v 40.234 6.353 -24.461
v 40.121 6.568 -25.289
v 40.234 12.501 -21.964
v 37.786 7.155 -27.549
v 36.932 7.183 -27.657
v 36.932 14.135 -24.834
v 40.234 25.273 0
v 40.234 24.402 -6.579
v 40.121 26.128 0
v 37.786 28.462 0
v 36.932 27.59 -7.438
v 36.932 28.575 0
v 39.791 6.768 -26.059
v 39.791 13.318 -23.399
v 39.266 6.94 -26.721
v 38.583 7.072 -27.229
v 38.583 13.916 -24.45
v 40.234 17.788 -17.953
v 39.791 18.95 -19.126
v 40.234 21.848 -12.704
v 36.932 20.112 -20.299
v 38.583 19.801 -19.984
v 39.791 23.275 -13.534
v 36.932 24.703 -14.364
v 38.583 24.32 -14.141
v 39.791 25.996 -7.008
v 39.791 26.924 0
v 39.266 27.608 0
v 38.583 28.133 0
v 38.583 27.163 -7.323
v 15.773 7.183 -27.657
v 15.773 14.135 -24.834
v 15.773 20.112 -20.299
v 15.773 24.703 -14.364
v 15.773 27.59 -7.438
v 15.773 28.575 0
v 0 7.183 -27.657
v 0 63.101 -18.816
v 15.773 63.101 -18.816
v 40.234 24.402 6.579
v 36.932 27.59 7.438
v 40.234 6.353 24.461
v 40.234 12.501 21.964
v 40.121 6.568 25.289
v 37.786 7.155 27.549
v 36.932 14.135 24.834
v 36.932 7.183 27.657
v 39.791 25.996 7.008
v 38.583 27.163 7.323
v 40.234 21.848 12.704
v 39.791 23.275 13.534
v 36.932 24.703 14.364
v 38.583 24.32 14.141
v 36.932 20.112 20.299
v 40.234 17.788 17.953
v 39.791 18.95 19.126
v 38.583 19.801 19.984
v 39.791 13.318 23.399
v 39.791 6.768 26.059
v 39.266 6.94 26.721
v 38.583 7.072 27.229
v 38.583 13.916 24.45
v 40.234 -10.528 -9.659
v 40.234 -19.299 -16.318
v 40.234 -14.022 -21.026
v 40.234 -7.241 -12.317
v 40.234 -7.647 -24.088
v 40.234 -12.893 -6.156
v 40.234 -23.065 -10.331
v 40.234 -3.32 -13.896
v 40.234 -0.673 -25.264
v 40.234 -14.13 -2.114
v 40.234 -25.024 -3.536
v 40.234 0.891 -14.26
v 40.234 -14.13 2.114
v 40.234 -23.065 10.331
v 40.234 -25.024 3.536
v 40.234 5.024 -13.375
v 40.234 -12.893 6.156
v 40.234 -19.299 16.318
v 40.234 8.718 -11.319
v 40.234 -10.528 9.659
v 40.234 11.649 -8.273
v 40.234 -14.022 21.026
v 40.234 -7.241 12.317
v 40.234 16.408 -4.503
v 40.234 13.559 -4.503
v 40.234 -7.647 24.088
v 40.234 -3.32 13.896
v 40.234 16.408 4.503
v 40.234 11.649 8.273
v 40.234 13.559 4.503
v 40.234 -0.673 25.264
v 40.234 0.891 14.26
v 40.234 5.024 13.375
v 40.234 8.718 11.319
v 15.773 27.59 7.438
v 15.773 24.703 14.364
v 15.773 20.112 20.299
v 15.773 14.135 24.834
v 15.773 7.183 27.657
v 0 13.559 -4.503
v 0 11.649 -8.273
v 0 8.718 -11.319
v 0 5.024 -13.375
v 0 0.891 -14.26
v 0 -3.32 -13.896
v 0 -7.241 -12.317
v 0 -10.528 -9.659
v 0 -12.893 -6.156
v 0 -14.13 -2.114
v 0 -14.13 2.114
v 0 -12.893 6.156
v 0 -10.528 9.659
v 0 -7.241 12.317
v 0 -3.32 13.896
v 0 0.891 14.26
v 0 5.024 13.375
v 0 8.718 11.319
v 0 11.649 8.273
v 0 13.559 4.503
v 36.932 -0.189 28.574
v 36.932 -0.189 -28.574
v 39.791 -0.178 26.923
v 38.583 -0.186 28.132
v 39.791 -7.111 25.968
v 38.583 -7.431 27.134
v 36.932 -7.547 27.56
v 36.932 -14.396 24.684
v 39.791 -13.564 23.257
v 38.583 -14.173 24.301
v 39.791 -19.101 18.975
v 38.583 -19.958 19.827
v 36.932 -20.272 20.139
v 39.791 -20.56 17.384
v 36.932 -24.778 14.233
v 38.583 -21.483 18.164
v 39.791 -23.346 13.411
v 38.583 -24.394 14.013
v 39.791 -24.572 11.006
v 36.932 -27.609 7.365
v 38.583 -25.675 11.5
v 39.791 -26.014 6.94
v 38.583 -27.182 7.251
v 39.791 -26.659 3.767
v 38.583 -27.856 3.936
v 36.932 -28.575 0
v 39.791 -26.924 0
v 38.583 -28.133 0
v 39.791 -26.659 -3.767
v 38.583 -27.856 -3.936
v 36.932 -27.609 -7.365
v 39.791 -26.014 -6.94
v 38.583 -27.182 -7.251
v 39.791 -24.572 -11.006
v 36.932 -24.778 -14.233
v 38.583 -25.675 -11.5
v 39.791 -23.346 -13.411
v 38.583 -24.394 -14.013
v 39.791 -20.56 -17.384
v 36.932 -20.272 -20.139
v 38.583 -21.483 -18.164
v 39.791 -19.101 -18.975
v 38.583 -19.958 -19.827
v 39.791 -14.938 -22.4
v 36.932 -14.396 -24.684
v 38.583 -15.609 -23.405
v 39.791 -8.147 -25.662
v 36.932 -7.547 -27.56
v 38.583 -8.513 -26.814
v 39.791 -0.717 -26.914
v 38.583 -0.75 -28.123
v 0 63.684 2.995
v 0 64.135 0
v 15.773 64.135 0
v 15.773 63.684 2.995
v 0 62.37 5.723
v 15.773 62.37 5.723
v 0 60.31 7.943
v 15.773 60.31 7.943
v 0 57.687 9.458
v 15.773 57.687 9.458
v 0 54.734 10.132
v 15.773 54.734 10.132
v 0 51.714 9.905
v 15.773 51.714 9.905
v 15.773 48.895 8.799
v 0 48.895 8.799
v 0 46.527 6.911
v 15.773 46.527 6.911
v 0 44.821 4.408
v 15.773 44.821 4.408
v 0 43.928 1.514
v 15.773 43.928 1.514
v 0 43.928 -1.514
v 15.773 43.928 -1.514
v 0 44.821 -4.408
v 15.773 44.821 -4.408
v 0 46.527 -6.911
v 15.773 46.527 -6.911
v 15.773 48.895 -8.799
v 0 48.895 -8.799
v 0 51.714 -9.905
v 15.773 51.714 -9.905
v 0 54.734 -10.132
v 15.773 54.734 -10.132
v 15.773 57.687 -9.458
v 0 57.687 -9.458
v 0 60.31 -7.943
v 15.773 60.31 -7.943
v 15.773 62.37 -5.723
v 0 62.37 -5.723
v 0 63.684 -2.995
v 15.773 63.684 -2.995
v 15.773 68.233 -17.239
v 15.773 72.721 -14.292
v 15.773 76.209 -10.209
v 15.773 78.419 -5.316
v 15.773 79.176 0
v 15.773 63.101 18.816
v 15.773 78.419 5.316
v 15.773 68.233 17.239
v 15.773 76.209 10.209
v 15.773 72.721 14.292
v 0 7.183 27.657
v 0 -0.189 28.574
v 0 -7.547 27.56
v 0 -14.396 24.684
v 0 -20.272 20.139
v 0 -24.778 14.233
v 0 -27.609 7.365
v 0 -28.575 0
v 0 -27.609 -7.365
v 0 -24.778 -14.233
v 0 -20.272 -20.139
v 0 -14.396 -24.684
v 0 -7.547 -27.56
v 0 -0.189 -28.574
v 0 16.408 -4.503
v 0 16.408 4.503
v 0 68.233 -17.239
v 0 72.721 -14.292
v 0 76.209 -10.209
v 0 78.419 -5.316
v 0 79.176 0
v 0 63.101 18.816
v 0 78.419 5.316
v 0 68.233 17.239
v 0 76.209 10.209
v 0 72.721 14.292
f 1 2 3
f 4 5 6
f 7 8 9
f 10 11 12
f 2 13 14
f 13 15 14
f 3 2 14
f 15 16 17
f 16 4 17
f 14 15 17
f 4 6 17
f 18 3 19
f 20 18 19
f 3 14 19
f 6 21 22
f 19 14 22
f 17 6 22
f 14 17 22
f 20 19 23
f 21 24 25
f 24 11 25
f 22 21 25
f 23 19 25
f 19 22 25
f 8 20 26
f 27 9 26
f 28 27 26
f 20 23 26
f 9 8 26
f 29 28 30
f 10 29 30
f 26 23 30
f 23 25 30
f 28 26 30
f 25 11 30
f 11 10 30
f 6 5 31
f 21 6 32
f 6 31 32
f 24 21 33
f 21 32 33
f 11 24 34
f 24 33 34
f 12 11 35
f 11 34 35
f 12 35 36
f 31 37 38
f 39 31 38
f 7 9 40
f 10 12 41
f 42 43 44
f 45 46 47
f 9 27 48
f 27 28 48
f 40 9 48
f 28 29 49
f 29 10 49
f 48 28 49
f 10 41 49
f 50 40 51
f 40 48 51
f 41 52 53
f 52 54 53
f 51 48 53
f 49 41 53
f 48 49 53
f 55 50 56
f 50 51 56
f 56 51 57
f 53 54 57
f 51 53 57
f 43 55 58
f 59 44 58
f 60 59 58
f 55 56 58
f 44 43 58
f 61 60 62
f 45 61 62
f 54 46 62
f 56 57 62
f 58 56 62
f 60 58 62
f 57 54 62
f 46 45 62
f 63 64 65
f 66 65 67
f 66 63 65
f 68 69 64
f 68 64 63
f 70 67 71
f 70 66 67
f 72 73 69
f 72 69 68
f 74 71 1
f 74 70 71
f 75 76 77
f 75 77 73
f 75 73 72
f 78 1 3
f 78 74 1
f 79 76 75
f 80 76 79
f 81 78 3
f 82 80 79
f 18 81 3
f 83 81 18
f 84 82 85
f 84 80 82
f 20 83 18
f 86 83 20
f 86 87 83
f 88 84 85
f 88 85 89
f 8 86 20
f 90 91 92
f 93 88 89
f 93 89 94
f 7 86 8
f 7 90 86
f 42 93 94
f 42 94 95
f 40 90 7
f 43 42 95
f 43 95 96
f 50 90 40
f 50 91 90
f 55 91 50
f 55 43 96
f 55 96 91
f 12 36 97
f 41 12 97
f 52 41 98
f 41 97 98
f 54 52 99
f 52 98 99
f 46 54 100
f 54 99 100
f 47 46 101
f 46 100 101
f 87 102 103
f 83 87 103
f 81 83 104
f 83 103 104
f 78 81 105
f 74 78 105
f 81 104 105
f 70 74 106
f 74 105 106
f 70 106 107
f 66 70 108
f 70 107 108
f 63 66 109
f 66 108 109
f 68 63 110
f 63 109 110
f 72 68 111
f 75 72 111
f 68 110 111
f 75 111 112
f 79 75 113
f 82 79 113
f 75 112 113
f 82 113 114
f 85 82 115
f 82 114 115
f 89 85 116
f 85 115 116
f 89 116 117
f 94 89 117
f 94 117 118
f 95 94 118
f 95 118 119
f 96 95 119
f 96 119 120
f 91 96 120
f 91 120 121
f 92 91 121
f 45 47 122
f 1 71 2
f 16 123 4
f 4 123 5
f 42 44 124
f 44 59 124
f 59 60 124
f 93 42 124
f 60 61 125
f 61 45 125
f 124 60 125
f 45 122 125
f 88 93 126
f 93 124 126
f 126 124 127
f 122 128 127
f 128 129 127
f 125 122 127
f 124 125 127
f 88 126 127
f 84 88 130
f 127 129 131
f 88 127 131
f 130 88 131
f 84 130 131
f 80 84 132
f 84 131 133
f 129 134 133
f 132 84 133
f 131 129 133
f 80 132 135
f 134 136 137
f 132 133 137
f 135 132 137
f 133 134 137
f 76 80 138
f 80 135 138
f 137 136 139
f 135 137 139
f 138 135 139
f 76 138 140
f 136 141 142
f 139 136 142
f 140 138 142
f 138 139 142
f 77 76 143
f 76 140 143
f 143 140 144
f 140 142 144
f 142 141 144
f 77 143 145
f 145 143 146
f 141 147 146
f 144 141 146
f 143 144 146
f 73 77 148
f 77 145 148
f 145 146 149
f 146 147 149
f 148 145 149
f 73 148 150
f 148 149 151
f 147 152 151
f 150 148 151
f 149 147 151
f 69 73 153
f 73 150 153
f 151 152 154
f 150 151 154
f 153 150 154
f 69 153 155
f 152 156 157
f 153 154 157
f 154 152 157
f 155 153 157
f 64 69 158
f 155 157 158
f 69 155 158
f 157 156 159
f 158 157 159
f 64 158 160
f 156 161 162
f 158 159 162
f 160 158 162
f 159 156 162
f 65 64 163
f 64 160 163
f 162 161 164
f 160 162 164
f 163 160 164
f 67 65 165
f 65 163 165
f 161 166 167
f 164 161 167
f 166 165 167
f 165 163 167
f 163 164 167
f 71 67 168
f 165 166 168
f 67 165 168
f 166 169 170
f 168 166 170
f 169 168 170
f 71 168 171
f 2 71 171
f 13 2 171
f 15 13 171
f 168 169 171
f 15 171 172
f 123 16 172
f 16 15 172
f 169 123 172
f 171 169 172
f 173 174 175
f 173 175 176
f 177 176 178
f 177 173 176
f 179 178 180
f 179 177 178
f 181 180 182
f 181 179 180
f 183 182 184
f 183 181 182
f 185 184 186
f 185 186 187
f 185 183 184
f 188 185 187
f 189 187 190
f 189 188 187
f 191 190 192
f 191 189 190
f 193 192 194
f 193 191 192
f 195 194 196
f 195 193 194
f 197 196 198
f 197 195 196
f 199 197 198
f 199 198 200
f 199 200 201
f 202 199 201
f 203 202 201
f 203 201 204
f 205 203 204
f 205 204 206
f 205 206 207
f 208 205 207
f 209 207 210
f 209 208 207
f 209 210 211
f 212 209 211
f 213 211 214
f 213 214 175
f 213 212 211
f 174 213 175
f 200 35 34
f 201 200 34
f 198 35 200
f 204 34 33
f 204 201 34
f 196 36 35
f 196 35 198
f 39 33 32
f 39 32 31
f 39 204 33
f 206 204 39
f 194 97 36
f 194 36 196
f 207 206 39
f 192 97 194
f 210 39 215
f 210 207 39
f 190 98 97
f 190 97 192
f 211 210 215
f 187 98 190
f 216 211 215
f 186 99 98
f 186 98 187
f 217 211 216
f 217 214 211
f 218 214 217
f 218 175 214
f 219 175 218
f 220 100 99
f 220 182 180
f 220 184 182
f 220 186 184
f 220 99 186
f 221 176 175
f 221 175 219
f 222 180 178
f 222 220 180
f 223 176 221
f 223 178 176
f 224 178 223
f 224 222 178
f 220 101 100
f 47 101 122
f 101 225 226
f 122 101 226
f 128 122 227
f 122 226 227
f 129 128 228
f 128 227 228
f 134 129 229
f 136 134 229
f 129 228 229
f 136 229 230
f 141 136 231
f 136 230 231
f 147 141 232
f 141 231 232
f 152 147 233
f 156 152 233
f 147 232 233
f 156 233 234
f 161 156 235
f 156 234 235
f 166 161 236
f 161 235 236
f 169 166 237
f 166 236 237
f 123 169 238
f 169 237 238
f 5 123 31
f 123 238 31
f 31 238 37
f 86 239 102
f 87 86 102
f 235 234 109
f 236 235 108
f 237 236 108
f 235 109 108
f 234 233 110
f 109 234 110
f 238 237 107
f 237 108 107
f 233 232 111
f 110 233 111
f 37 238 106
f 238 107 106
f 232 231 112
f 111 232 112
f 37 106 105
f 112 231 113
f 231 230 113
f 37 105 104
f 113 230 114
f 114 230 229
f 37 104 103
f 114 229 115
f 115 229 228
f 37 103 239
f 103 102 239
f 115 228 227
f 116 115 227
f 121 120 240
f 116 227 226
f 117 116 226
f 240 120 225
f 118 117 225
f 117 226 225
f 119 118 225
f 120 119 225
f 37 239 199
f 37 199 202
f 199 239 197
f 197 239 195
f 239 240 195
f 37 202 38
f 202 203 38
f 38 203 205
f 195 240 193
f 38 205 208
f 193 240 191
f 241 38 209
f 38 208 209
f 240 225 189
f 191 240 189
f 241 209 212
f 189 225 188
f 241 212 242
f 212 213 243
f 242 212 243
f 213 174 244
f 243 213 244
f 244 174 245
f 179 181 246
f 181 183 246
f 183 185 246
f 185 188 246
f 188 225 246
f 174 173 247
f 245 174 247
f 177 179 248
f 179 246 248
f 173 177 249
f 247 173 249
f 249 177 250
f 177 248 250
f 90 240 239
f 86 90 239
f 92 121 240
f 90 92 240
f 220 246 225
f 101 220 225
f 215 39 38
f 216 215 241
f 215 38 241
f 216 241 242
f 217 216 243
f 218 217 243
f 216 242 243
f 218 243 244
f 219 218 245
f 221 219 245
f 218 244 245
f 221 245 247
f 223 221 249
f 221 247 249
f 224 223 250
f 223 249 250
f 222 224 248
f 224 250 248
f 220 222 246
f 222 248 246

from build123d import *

# Parameters (mm, degrees)
F1_DEPTH = 40.2336
F0_R     = 10.16
F2_DEPTH = 15.7734
F3_R     = 3.302


with BuildPart() as f1:
    # F0 (on Right) → F1 (new body)
    with BuildSketch(Plane.YZ):
        with BuildLine():
            ThreePointArc((7.18307, -27.657443), (22.602952, -17.482483), (28.575, 0))
            ThreePointArc((28.575, 0), (22.602952, 17.482483), (7.18307, 27.657443))
            ThreePointArc((7.18307, 27.657443), (-28.575, 0), (7.18307, -27.657443))
        make_face()
        with BuildLine():
            ThreePointArc((13.559429, -4.502727), (-14.2875, 0), (13.559429, 4.502727))
            Line((13.559429, 4.502727), (16.4084, 4.502727))
            Line((16.4084, 4.502727), (16.4084, -4.502727))
            Line((16.4084, -4.502727), (13.559429, -4.502727))
        make_face(mode=Mode.SUBTRACT)
    extrude(amount=F1_DEPTH)

    # F0 (on Right) → F2 (join)
    with BuildSketch(Plane.YZ):
        with BuildLine():
            ThreePointArc((7.18307, -27.657443), (22.602952, -17.482483), (28.575, 0))
            ThreePointArc((28.575, 0), (22.602952, 17.482483), (7.18307, 27.657443))
            ThreePointArc((7.18307, 27.657443), (-28.575, 0), (7.18307, -27.657443))
        make_face()
        with BuildLine():
            ThreePointArc((13.559429, -4.502727), (-14.2875, 0), (13.559429, 4.502727))
            Line((13.559429, 4.502727), (16.4084, 4.502727))
            Line((16.4084, 4.502727), (16.4084, -4.502727))
            Line((16.4084, -4.502727), (13.559429, -4.502727))
        make_face(mode=Mode.SUBTRACT)
        with BuildLine():
            ThreePointArc((7.18307, 27.657443), (22.602952, 17.482483), (28.575, 0))
            ThreePointArc((28.575, 0), (22.602952, -17.482483), (7.18307, -27.657443))
            Line((7.18307, -27.657443), (63.100665, -18.816257))
            ThreePointArc((63.100665, -18.816257), (79.175608, 0), (63.100665, 18.816257))
            Line((63.100665, 18.816257), (7.18307, 27.657443))
        make_face()
        with Locations((53.975, 0)):
            Circle(F0_R, mode=Mode.SUBTRACT)
    extrude(amount=F2_DEPTH)

    # F3
    f3_edges = [f1.edges().sort_by_distance(p)[0] for p in [
        (40.2336, -7.18307, 27.657443),
    ]]
    fillet(f3_edges, radius=F3_R)


solid = f1.part
